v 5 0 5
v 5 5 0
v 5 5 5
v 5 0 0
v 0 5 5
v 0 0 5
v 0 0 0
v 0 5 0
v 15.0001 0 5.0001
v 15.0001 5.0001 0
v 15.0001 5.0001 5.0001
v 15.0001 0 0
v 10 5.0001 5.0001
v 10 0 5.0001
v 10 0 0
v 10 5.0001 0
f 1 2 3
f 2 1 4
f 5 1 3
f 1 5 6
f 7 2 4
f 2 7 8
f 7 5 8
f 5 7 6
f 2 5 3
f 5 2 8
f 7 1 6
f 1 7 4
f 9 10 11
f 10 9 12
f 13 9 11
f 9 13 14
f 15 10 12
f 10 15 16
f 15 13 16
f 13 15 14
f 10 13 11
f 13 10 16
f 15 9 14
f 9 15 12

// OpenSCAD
color("red") cube(5);
translate([10,0,0]) color("blue") cube(5.0001);
